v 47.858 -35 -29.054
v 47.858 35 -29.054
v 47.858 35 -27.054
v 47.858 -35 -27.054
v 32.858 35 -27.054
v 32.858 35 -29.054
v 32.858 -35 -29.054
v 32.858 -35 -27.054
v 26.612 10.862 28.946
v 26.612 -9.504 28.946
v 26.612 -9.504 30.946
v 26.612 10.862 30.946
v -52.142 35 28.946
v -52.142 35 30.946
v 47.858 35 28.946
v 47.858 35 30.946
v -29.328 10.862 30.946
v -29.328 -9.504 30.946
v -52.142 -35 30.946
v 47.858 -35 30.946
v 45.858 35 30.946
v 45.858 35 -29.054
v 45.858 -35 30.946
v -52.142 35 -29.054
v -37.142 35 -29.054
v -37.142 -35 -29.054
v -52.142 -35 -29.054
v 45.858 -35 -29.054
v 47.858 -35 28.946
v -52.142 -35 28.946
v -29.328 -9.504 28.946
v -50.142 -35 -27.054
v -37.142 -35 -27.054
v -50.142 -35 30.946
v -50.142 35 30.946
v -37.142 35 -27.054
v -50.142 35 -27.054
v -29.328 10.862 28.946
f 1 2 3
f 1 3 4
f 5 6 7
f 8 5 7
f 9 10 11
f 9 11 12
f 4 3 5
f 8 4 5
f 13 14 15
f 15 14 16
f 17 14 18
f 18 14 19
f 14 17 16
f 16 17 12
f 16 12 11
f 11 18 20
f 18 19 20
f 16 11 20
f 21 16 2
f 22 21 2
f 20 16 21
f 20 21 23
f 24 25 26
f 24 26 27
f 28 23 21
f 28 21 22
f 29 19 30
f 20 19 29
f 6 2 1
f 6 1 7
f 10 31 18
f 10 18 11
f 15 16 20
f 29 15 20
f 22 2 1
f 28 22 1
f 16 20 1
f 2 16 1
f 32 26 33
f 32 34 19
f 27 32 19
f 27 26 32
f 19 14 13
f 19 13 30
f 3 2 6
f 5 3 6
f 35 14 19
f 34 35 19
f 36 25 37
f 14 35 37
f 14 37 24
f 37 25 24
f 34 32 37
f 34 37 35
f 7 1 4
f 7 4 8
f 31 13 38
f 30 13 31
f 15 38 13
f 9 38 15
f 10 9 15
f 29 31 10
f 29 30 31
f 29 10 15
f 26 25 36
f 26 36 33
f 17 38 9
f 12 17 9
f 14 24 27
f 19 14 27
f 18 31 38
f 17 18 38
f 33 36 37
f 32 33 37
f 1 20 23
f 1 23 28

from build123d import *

# Parameters (mm, degrees)
F1_E0_W  = 15
F1_E0_H  = 70
F2_DEPTH = 2
F1_E4_W  = 15
F1_E4_H  = 70
F1_E1_W  = 60
F1_E1_H  = 70
F3_DEPTH = 2
F1_E2_W  = 100
F1_E2_H  = 70
F4_DEPTH = 2
F1_E3_W  = 60
F1_E3_H  = 70
F5_DEPTH = 2
F6_W     = 55.9396576136
F6_H     = 20.3663799912
F7_DEPTH = 30.9466302677


with BuildPart() as f2:
    # F1_E0 (on explicit) → F2 (new body)
    with BuildSketch(Plane(origin=(-37.1421206879, 35, -29.0543697323), x_dir=(-1, 0, 0), z_dir=(0, 0, 1))):
        with Locations((7.5, 35)):
            Rectangle(F1_E0_W, F1_E0_H)
    extrude(amount=F2_DEPTH)

    # F1_E1 (on explicit) → F3 (join)
    with BuildSketch(Plane(origin=(-52.1421206879, 35, -29.0543697323), x_dir=(0, 0, 1), z_dir=(1, 0, 0))):
        with Locations((30, 35)):
            Rectangle(F1_E1_W, F1_E1_H)
    extrude(amount=F3_DEPTH)


with BuildPart() as f2b:
    # F1_E4 (on explicit) → F2, piece 2 (new body)
    with BuildSketch(Plane(origin=(47.8578793121, 35, -29.0543697323), x_dir=(-1, 0, 0), z_dir=(0, 0, 1))):
        with Locations((7.5, 35)):
            Rectangle(F1_E4_W, F1_E4_H)
    extrude(amount=F2_DEPTH)


with BuildPart() as f4:
    # F1_E2 (on explicit) → F4 (new body)
    with BuildSketch(Plane(origin=(-52.1421206879, 35, 30.9456302677), x_dir=(1, 0, 0), z_dir=(0, 0, -1))):
        with Locations((50, 35)):
            Rectangle(F1_E2_W, F1_E2_H)
    extrude(amount=F4_DEPTH)

    # F6 (on Top) → F7 (cut, through all)
    with BuildSketch(Plane.XY):
        with Locations((-1.357759349, 0.6788792089)):
            Rectangle(F6_W, F6_H)
    extrude(amount=F7_DEPTH, mode=Mode.SUBTRACT)


with BuildPart() as f5:
    # F1_E3 (on explicit) → F5 (new body)
    with BuildSketch(Plane(origin=(47.8578793121, 35, 30.9456302677), x_dir=(0, 0, -1), z_dir=(-1, 0, 0))):
        with Locations((30, 35)):
            Rectangle(F1_E3_W, F1_E3_H)
    extrude(amount=F5_DEPTH)


solid = Compound([f2.part, f2b.part, f4.part, f5.part])
